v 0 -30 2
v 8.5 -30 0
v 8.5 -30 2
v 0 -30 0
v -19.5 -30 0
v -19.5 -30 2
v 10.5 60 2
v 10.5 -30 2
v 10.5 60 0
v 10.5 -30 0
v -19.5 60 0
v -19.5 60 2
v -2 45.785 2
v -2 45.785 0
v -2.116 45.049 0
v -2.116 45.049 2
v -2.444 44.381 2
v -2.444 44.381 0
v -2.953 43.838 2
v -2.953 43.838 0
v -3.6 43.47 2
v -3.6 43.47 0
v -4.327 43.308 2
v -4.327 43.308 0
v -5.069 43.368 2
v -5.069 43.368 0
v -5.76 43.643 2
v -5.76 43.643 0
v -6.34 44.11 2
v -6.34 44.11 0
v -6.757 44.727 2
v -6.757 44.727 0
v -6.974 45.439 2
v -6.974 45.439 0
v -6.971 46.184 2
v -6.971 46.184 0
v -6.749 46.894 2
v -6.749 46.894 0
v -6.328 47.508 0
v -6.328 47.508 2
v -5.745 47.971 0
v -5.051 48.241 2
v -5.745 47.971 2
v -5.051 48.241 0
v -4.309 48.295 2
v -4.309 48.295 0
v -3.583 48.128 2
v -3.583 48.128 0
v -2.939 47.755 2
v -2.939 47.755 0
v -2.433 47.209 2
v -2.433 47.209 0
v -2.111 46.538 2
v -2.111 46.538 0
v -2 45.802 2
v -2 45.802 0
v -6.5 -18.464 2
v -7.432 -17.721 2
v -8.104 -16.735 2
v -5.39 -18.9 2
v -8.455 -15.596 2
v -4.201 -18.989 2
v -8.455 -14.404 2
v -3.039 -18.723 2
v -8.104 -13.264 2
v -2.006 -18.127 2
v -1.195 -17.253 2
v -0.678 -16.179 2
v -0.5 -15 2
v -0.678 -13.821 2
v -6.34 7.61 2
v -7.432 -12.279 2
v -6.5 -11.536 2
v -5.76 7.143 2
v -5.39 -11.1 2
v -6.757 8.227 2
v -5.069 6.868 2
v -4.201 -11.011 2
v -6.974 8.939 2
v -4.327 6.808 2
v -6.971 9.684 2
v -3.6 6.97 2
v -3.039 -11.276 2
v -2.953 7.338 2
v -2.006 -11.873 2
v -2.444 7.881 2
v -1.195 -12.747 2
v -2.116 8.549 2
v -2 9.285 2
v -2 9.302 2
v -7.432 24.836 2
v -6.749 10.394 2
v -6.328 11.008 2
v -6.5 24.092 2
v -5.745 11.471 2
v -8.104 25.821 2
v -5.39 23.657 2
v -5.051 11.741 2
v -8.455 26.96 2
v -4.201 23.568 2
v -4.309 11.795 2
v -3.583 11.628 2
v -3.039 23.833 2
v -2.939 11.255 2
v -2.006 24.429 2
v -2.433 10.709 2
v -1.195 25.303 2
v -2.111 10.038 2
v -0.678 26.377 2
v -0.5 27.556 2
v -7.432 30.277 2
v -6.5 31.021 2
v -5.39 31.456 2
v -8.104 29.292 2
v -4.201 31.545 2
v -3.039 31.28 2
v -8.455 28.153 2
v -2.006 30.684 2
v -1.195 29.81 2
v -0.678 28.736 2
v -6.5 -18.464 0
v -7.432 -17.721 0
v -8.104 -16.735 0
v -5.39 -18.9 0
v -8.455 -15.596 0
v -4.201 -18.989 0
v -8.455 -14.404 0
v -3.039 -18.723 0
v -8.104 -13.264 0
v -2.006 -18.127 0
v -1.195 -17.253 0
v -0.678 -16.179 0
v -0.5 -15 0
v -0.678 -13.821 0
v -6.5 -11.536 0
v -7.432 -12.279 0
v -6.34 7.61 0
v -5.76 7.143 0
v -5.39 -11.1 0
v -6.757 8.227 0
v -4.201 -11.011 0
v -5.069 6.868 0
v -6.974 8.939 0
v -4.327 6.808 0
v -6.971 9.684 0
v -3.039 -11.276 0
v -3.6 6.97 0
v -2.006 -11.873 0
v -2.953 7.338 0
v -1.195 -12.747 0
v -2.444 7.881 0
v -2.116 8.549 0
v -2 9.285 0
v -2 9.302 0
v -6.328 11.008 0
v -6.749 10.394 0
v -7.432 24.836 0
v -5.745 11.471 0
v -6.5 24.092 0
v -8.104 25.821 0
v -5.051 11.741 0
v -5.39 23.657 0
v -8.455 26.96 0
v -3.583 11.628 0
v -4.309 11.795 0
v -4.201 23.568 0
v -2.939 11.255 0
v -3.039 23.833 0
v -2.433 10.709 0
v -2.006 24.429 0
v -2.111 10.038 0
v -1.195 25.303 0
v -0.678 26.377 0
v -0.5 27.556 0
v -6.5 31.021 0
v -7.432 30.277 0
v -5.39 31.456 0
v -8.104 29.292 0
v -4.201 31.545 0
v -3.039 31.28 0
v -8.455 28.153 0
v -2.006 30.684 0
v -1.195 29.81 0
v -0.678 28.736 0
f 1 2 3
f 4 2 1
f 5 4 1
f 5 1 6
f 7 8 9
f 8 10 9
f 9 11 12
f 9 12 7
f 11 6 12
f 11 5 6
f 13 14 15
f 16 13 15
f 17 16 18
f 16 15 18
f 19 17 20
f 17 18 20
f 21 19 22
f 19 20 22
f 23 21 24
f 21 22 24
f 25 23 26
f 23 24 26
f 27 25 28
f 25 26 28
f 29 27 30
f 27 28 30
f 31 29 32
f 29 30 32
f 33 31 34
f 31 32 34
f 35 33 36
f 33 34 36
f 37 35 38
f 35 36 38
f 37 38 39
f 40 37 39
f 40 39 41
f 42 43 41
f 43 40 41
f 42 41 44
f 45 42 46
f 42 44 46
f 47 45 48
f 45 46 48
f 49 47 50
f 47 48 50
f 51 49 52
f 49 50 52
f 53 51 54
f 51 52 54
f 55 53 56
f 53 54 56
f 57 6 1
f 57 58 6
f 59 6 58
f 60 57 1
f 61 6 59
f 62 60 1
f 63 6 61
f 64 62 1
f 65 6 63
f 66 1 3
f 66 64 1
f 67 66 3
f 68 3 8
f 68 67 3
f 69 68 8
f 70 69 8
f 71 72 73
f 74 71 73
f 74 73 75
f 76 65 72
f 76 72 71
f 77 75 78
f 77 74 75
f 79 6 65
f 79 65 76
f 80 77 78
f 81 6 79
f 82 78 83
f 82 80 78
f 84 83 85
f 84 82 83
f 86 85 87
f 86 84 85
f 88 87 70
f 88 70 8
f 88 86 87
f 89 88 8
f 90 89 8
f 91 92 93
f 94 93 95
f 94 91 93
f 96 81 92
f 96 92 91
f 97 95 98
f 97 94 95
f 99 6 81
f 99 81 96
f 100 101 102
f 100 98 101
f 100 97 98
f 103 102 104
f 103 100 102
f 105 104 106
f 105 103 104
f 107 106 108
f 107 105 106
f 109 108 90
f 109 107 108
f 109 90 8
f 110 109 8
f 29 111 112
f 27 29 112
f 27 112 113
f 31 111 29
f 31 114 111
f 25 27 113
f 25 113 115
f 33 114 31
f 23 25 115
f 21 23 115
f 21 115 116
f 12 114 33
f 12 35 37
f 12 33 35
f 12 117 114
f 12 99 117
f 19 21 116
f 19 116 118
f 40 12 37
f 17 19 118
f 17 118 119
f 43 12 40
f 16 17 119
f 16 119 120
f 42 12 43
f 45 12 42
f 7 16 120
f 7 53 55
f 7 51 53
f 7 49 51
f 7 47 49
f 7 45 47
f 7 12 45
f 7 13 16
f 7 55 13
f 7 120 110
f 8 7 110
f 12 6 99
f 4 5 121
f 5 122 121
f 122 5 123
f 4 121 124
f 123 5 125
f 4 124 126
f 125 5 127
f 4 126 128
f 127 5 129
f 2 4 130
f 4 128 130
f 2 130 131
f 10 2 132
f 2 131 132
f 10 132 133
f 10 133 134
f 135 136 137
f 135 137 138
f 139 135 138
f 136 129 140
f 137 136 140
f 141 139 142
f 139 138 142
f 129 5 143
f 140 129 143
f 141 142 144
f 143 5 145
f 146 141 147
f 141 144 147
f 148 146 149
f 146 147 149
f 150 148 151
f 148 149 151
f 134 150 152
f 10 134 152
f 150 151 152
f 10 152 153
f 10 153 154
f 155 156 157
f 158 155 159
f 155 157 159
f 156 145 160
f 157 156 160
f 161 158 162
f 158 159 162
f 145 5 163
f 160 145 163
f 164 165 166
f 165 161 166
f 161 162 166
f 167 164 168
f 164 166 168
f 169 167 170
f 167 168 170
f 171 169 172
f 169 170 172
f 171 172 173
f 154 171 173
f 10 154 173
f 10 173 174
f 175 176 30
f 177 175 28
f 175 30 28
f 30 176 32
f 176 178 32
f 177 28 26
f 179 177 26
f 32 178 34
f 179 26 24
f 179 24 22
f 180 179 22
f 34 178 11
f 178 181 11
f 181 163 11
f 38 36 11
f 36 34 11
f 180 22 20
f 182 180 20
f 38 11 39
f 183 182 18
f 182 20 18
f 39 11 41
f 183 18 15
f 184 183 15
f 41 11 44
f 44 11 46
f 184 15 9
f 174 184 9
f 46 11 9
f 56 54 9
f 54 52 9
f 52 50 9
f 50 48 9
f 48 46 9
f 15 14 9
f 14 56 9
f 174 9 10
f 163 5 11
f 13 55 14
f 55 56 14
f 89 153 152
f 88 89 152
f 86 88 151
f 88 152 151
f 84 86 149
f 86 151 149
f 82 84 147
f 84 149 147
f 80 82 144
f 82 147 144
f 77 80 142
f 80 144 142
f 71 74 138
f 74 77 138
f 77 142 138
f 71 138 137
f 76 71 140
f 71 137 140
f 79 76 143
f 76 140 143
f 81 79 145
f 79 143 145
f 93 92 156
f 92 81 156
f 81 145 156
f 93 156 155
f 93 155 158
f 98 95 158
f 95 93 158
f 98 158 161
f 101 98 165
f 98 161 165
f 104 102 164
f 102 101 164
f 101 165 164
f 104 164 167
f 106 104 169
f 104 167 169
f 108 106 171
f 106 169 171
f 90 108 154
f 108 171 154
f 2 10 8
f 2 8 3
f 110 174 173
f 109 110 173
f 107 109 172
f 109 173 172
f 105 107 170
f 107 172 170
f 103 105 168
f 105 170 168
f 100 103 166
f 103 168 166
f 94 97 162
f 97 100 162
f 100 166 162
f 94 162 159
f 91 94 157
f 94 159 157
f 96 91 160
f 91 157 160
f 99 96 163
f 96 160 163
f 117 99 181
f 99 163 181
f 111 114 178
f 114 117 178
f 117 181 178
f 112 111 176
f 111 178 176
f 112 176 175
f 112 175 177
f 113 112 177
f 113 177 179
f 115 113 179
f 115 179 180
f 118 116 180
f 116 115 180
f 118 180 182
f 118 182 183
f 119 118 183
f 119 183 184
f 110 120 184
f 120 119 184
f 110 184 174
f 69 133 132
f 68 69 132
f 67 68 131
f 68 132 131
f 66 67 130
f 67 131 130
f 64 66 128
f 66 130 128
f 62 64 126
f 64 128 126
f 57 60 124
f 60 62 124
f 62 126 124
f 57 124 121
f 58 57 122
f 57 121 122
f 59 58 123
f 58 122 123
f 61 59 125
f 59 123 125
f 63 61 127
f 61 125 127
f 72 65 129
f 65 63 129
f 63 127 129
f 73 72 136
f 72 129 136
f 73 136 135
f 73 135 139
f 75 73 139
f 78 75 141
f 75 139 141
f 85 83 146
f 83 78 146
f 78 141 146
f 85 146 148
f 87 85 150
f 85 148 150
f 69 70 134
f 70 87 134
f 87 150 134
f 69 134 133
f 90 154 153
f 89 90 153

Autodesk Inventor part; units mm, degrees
ref_plane "YZ Plane" through (0, 0, 0) normal (1, 0, 0) x (0, 1, 0)
ref_plane "XZ Plane" through (0, 0, 0) normal (0, 1, 0) x (-1, 0, 0)
ref_plane "XY Plane" through (0, 0, 0) normal (0, 0, 1) x (1, 0, 0)
sketch "Sketch1" plane through (0, 0, 0) normal (0, 0, 1) x (1, 0, 0)
  ellipse E0 centre (-4.5001, 27.5565) end of major axis (-7.5001, 27.5565) minor radius 3
  line L0 (-2.0001, 9.3017) -> (-2.0001, 9.2846)
  line L1 (-2.0001, 45.8017) -> (-2.0001, 45.7846)
  line L2 (-1445.7599, 60) -> (10.4999, 60)
  line L3 (-19.4999, -29.9999) -> (-19.4999, 60)
  line L4 (10.4999, -29.9999) -> (10.4999, 60)
  line L5 (8.4999, -29.9999) -> (0, -29.9999)
  line L6 (10.4999, -29.9999) -> (-19.4999, -29.9999)
  line L7 (-19.4999, -29.9999) -> (-19.4999, 60)
  line L8 (-19.4999, 60) -> (10.4999, 60)
  line L9 (10.4999, 60) -> (10.4999, -29.9999)
  circle A0 centre (-4.5001, 27.5565) radius 4
  circle A1 centre (-4.5001, 45.8024) radius 2.5
  circle A2 centre (-4.5001, 9.3024) radius 2.5
  line L10 (-4.5, -29.9999) -> (-4.5, -14.9999) construction
  circle A3 centre (-4.5, -14.9999) radius 4
  point P0 (0, 0)
  dimension "d0" = 8
  dimension "d1" = 5
  dimension "d2" = 89.9999
  dimension "d3" = 15
  dimension "d4" = 8
extrude "Plate1" add sketch "Sketch1" along normal blind 2 contours L2 L4 L6 L5 L3
equation "\"BendRadius\" = Thickness"
equation "\"BendReliefWidth\" = Thickness"
equation "\"BendReliefDepth\" = 0.5 * Thickness"
equation "\"CornerReliefSize\" = 4 * Thickness"
equation "\"MinimumRemnant\" = 2 * Thickness"
equation "\"TransitionRadius\" = BendRadius"
equation "\"JacobiRadiusSize\" = BendRadius"
equation "\"GapSize\" = Thickness"
equation "\"d5\" = BendRadius"
equation "\"Thickness\" = 2"
properties part number "gabatarito-rolamento" material "Wood (Oak)"
